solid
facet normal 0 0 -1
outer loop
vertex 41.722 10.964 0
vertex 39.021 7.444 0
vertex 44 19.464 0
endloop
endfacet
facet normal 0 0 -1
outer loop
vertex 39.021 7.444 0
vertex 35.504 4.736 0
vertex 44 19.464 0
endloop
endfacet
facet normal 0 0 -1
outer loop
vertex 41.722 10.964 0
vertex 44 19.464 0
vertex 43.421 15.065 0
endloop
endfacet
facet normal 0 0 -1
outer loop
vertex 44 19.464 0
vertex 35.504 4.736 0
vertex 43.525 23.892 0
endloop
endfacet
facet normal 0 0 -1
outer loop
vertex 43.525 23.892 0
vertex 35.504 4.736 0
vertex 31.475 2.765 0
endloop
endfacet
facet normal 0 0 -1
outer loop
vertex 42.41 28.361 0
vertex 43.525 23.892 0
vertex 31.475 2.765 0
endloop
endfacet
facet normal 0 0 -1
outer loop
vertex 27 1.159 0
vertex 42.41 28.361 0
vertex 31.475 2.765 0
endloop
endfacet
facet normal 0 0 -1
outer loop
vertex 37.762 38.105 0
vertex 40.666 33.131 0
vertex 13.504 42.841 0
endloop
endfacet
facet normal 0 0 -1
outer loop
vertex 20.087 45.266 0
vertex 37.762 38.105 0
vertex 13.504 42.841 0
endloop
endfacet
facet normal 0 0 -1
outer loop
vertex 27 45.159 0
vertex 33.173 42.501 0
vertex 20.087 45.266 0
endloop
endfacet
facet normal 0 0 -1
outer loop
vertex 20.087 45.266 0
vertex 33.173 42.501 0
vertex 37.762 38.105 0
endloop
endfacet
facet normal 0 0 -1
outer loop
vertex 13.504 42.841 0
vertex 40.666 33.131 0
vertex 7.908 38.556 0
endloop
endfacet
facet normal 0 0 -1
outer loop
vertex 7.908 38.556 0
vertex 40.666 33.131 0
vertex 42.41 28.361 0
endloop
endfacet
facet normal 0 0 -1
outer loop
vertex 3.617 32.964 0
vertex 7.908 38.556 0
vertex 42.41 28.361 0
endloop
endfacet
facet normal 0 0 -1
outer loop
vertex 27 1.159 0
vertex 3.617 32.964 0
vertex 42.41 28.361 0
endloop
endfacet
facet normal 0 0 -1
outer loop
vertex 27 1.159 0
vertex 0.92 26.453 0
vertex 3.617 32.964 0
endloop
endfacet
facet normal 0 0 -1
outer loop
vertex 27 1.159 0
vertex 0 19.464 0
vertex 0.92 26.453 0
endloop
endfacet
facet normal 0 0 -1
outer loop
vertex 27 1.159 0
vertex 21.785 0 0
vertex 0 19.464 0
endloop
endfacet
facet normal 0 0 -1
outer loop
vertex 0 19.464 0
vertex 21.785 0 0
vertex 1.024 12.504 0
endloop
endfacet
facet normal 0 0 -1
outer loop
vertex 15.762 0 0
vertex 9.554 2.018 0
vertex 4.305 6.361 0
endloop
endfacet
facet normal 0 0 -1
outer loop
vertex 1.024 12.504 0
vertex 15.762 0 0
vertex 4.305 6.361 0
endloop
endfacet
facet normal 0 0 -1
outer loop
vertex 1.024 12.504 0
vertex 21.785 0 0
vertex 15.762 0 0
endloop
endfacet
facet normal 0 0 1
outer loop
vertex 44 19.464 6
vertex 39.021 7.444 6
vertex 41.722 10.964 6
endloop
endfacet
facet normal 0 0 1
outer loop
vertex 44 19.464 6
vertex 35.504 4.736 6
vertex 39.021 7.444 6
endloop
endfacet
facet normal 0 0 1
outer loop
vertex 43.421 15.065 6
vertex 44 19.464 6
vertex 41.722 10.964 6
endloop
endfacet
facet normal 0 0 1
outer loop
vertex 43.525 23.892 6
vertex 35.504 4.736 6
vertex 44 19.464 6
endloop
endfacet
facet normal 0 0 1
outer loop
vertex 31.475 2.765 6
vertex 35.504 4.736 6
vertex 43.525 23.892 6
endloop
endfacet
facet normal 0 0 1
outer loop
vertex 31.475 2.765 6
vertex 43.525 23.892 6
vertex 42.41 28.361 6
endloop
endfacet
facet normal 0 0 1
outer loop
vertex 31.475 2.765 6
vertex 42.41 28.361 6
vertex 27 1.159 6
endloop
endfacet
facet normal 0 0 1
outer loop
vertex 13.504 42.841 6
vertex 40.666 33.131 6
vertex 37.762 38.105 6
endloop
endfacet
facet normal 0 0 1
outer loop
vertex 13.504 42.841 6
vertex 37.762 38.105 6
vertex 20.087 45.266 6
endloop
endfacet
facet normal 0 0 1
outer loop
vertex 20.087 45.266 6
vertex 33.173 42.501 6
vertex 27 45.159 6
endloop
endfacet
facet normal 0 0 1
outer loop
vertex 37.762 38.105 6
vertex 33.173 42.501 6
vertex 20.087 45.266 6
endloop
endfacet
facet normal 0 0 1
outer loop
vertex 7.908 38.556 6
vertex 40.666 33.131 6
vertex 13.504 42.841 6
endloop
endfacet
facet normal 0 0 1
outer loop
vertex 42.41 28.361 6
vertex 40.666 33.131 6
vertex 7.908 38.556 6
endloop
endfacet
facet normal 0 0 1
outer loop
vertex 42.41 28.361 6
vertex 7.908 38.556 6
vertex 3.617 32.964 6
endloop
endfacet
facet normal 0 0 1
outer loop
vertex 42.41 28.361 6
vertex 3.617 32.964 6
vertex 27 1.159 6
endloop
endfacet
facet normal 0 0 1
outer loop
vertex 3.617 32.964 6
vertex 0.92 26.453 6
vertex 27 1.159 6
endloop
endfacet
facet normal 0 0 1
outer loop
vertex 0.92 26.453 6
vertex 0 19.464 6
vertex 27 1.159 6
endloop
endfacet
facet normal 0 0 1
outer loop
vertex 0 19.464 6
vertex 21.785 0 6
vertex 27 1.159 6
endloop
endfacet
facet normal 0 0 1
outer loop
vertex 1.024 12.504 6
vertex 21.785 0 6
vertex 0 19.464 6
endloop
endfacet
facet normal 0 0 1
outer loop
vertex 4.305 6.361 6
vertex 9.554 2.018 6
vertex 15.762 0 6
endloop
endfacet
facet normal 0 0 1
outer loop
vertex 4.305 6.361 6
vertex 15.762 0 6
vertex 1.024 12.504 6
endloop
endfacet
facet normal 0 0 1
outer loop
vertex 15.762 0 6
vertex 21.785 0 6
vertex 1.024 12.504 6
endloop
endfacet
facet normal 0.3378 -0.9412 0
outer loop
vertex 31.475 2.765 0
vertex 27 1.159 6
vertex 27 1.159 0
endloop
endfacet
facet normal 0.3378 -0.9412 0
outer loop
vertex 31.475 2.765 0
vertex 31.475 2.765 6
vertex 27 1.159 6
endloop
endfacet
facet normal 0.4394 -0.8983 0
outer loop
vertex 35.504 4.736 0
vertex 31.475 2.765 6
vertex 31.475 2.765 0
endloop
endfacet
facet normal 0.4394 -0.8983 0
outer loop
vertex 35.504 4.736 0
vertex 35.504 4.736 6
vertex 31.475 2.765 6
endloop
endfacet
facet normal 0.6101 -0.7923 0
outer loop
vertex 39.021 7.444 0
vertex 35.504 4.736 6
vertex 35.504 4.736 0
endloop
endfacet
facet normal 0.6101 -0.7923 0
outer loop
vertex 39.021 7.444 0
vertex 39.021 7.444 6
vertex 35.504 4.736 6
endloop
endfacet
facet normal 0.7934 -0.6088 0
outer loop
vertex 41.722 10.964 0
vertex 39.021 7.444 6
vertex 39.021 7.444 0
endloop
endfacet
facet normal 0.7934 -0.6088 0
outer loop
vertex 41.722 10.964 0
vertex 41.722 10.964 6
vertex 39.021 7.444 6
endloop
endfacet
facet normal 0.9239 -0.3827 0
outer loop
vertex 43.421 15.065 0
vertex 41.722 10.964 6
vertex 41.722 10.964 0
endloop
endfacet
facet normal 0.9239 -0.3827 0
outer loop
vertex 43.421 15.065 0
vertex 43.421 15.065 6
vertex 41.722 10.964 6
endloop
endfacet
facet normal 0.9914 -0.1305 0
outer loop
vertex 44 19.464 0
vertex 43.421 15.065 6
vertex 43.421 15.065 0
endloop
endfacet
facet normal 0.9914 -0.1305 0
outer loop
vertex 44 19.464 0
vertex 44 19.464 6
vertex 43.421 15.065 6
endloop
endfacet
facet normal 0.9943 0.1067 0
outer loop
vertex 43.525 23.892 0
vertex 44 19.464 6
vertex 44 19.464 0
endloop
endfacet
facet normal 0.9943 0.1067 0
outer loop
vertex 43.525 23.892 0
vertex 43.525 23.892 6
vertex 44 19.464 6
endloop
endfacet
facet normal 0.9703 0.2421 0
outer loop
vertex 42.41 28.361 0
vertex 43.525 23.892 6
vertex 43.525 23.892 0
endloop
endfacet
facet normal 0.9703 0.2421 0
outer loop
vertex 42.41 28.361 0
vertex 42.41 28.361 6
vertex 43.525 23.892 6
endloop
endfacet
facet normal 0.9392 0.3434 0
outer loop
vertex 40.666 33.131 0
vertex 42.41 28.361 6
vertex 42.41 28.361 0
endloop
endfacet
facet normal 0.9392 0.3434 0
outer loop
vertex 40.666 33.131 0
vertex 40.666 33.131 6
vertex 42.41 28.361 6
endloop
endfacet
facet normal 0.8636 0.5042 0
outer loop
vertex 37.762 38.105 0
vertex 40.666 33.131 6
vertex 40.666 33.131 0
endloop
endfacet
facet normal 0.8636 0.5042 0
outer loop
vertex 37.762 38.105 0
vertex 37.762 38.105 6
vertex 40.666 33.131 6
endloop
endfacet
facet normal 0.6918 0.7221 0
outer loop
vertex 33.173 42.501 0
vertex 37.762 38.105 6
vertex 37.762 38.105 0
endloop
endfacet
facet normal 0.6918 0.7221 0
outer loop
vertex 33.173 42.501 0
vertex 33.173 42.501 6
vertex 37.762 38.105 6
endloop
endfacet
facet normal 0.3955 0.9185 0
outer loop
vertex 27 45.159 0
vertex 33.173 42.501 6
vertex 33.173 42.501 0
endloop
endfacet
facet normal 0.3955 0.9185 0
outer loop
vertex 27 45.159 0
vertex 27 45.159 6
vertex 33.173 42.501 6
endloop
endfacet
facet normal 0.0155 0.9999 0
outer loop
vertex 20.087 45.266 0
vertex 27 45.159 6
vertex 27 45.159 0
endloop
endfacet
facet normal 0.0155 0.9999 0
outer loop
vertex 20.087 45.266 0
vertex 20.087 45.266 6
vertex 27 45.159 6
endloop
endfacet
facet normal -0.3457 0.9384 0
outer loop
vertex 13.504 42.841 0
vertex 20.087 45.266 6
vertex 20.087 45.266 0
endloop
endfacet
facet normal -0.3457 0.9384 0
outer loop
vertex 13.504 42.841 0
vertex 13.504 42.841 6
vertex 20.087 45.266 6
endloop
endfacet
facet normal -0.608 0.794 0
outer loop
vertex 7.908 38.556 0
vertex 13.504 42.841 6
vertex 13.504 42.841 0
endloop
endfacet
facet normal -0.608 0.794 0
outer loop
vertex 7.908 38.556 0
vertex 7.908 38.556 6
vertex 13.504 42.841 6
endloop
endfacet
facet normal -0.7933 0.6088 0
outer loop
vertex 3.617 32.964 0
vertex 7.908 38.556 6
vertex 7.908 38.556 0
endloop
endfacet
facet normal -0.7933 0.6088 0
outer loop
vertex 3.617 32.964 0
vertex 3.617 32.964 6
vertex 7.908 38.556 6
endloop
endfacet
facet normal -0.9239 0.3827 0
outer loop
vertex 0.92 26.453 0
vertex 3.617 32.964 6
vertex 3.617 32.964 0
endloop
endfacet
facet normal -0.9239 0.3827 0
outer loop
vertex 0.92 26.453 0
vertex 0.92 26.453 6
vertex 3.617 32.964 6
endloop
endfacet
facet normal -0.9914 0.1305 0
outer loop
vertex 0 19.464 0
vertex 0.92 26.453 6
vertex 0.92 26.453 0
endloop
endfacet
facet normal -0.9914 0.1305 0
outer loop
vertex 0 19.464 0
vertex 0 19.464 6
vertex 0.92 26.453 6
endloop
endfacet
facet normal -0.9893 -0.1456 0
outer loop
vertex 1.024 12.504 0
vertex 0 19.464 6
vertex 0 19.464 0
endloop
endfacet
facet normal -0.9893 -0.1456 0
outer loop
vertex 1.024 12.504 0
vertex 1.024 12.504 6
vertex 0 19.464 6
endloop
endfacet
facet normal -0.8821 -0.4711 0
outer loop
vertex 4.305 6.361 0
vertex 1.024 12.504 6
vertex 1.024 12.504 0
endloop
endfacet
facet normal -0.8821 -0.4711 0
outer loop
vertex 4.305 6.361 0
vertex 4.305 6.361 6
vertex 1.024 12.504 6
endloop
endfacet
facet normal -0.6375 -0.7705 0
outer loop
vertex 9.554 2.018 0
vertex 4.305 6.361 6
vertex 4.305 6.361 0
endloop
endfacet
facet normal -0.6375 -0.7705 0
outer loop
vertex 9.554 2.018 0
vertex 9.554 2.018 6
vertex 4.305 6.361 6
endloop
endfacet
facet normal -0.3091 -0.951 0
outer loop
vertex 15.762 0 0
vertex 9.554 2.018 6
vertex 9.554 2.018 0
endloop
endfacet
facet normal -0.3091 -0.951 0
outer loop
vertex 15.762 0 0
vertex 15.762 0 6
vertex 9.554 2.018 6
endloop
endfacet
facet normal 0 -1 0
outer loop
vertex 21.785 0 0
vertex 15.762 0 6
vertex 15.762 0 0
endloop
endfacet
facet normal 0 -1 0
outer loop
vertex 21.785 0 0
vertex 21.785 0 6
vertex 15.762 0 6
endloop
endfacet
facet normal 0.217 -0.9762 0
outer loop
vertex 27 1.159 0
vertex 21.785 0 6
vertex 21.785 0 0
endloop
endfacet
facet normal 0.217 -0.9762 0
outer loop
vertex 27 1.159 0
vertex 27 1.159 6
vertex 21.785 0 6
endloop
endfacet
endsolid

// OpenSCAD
$fn = 32;

// ----------------------------------------------------------------------
// Cam disc: base radius 17.0 mm, lift 10.0 mm, 24 profile points
// ----------------------------------------------------------------------

// --- parameters (mm) ---
profile_height = 6;       // extrusion height
profile_points = 24;      // points of the closed outline

profile = [[44, 19.464], [43.525, 23.892], [42.41, 28.361], [40.666, 33.131], [37.762, 38.105], [33.173, 42.501], [27, 45.159], [20.087, 45.266], [13.504, 42.841], [7.908, 38.556], [3.617, 32.964], [0.92, 26.453], [0, 19.464], [1.024, 12.504], [4.305, 6.361], [9.554, 2.018], [15.762, 0], [21.785, 0], [27, 1.159], [31.475, 2.765], [35.504, 4.736], [39.021, 7.444], [41.722, 10.964], [43.421, 15.065]];  // single closed polygon, 24 points, counter clockwise

// --- the one profile operation ---
linear_extrude(height = profile_height) polygon(points = profile);
